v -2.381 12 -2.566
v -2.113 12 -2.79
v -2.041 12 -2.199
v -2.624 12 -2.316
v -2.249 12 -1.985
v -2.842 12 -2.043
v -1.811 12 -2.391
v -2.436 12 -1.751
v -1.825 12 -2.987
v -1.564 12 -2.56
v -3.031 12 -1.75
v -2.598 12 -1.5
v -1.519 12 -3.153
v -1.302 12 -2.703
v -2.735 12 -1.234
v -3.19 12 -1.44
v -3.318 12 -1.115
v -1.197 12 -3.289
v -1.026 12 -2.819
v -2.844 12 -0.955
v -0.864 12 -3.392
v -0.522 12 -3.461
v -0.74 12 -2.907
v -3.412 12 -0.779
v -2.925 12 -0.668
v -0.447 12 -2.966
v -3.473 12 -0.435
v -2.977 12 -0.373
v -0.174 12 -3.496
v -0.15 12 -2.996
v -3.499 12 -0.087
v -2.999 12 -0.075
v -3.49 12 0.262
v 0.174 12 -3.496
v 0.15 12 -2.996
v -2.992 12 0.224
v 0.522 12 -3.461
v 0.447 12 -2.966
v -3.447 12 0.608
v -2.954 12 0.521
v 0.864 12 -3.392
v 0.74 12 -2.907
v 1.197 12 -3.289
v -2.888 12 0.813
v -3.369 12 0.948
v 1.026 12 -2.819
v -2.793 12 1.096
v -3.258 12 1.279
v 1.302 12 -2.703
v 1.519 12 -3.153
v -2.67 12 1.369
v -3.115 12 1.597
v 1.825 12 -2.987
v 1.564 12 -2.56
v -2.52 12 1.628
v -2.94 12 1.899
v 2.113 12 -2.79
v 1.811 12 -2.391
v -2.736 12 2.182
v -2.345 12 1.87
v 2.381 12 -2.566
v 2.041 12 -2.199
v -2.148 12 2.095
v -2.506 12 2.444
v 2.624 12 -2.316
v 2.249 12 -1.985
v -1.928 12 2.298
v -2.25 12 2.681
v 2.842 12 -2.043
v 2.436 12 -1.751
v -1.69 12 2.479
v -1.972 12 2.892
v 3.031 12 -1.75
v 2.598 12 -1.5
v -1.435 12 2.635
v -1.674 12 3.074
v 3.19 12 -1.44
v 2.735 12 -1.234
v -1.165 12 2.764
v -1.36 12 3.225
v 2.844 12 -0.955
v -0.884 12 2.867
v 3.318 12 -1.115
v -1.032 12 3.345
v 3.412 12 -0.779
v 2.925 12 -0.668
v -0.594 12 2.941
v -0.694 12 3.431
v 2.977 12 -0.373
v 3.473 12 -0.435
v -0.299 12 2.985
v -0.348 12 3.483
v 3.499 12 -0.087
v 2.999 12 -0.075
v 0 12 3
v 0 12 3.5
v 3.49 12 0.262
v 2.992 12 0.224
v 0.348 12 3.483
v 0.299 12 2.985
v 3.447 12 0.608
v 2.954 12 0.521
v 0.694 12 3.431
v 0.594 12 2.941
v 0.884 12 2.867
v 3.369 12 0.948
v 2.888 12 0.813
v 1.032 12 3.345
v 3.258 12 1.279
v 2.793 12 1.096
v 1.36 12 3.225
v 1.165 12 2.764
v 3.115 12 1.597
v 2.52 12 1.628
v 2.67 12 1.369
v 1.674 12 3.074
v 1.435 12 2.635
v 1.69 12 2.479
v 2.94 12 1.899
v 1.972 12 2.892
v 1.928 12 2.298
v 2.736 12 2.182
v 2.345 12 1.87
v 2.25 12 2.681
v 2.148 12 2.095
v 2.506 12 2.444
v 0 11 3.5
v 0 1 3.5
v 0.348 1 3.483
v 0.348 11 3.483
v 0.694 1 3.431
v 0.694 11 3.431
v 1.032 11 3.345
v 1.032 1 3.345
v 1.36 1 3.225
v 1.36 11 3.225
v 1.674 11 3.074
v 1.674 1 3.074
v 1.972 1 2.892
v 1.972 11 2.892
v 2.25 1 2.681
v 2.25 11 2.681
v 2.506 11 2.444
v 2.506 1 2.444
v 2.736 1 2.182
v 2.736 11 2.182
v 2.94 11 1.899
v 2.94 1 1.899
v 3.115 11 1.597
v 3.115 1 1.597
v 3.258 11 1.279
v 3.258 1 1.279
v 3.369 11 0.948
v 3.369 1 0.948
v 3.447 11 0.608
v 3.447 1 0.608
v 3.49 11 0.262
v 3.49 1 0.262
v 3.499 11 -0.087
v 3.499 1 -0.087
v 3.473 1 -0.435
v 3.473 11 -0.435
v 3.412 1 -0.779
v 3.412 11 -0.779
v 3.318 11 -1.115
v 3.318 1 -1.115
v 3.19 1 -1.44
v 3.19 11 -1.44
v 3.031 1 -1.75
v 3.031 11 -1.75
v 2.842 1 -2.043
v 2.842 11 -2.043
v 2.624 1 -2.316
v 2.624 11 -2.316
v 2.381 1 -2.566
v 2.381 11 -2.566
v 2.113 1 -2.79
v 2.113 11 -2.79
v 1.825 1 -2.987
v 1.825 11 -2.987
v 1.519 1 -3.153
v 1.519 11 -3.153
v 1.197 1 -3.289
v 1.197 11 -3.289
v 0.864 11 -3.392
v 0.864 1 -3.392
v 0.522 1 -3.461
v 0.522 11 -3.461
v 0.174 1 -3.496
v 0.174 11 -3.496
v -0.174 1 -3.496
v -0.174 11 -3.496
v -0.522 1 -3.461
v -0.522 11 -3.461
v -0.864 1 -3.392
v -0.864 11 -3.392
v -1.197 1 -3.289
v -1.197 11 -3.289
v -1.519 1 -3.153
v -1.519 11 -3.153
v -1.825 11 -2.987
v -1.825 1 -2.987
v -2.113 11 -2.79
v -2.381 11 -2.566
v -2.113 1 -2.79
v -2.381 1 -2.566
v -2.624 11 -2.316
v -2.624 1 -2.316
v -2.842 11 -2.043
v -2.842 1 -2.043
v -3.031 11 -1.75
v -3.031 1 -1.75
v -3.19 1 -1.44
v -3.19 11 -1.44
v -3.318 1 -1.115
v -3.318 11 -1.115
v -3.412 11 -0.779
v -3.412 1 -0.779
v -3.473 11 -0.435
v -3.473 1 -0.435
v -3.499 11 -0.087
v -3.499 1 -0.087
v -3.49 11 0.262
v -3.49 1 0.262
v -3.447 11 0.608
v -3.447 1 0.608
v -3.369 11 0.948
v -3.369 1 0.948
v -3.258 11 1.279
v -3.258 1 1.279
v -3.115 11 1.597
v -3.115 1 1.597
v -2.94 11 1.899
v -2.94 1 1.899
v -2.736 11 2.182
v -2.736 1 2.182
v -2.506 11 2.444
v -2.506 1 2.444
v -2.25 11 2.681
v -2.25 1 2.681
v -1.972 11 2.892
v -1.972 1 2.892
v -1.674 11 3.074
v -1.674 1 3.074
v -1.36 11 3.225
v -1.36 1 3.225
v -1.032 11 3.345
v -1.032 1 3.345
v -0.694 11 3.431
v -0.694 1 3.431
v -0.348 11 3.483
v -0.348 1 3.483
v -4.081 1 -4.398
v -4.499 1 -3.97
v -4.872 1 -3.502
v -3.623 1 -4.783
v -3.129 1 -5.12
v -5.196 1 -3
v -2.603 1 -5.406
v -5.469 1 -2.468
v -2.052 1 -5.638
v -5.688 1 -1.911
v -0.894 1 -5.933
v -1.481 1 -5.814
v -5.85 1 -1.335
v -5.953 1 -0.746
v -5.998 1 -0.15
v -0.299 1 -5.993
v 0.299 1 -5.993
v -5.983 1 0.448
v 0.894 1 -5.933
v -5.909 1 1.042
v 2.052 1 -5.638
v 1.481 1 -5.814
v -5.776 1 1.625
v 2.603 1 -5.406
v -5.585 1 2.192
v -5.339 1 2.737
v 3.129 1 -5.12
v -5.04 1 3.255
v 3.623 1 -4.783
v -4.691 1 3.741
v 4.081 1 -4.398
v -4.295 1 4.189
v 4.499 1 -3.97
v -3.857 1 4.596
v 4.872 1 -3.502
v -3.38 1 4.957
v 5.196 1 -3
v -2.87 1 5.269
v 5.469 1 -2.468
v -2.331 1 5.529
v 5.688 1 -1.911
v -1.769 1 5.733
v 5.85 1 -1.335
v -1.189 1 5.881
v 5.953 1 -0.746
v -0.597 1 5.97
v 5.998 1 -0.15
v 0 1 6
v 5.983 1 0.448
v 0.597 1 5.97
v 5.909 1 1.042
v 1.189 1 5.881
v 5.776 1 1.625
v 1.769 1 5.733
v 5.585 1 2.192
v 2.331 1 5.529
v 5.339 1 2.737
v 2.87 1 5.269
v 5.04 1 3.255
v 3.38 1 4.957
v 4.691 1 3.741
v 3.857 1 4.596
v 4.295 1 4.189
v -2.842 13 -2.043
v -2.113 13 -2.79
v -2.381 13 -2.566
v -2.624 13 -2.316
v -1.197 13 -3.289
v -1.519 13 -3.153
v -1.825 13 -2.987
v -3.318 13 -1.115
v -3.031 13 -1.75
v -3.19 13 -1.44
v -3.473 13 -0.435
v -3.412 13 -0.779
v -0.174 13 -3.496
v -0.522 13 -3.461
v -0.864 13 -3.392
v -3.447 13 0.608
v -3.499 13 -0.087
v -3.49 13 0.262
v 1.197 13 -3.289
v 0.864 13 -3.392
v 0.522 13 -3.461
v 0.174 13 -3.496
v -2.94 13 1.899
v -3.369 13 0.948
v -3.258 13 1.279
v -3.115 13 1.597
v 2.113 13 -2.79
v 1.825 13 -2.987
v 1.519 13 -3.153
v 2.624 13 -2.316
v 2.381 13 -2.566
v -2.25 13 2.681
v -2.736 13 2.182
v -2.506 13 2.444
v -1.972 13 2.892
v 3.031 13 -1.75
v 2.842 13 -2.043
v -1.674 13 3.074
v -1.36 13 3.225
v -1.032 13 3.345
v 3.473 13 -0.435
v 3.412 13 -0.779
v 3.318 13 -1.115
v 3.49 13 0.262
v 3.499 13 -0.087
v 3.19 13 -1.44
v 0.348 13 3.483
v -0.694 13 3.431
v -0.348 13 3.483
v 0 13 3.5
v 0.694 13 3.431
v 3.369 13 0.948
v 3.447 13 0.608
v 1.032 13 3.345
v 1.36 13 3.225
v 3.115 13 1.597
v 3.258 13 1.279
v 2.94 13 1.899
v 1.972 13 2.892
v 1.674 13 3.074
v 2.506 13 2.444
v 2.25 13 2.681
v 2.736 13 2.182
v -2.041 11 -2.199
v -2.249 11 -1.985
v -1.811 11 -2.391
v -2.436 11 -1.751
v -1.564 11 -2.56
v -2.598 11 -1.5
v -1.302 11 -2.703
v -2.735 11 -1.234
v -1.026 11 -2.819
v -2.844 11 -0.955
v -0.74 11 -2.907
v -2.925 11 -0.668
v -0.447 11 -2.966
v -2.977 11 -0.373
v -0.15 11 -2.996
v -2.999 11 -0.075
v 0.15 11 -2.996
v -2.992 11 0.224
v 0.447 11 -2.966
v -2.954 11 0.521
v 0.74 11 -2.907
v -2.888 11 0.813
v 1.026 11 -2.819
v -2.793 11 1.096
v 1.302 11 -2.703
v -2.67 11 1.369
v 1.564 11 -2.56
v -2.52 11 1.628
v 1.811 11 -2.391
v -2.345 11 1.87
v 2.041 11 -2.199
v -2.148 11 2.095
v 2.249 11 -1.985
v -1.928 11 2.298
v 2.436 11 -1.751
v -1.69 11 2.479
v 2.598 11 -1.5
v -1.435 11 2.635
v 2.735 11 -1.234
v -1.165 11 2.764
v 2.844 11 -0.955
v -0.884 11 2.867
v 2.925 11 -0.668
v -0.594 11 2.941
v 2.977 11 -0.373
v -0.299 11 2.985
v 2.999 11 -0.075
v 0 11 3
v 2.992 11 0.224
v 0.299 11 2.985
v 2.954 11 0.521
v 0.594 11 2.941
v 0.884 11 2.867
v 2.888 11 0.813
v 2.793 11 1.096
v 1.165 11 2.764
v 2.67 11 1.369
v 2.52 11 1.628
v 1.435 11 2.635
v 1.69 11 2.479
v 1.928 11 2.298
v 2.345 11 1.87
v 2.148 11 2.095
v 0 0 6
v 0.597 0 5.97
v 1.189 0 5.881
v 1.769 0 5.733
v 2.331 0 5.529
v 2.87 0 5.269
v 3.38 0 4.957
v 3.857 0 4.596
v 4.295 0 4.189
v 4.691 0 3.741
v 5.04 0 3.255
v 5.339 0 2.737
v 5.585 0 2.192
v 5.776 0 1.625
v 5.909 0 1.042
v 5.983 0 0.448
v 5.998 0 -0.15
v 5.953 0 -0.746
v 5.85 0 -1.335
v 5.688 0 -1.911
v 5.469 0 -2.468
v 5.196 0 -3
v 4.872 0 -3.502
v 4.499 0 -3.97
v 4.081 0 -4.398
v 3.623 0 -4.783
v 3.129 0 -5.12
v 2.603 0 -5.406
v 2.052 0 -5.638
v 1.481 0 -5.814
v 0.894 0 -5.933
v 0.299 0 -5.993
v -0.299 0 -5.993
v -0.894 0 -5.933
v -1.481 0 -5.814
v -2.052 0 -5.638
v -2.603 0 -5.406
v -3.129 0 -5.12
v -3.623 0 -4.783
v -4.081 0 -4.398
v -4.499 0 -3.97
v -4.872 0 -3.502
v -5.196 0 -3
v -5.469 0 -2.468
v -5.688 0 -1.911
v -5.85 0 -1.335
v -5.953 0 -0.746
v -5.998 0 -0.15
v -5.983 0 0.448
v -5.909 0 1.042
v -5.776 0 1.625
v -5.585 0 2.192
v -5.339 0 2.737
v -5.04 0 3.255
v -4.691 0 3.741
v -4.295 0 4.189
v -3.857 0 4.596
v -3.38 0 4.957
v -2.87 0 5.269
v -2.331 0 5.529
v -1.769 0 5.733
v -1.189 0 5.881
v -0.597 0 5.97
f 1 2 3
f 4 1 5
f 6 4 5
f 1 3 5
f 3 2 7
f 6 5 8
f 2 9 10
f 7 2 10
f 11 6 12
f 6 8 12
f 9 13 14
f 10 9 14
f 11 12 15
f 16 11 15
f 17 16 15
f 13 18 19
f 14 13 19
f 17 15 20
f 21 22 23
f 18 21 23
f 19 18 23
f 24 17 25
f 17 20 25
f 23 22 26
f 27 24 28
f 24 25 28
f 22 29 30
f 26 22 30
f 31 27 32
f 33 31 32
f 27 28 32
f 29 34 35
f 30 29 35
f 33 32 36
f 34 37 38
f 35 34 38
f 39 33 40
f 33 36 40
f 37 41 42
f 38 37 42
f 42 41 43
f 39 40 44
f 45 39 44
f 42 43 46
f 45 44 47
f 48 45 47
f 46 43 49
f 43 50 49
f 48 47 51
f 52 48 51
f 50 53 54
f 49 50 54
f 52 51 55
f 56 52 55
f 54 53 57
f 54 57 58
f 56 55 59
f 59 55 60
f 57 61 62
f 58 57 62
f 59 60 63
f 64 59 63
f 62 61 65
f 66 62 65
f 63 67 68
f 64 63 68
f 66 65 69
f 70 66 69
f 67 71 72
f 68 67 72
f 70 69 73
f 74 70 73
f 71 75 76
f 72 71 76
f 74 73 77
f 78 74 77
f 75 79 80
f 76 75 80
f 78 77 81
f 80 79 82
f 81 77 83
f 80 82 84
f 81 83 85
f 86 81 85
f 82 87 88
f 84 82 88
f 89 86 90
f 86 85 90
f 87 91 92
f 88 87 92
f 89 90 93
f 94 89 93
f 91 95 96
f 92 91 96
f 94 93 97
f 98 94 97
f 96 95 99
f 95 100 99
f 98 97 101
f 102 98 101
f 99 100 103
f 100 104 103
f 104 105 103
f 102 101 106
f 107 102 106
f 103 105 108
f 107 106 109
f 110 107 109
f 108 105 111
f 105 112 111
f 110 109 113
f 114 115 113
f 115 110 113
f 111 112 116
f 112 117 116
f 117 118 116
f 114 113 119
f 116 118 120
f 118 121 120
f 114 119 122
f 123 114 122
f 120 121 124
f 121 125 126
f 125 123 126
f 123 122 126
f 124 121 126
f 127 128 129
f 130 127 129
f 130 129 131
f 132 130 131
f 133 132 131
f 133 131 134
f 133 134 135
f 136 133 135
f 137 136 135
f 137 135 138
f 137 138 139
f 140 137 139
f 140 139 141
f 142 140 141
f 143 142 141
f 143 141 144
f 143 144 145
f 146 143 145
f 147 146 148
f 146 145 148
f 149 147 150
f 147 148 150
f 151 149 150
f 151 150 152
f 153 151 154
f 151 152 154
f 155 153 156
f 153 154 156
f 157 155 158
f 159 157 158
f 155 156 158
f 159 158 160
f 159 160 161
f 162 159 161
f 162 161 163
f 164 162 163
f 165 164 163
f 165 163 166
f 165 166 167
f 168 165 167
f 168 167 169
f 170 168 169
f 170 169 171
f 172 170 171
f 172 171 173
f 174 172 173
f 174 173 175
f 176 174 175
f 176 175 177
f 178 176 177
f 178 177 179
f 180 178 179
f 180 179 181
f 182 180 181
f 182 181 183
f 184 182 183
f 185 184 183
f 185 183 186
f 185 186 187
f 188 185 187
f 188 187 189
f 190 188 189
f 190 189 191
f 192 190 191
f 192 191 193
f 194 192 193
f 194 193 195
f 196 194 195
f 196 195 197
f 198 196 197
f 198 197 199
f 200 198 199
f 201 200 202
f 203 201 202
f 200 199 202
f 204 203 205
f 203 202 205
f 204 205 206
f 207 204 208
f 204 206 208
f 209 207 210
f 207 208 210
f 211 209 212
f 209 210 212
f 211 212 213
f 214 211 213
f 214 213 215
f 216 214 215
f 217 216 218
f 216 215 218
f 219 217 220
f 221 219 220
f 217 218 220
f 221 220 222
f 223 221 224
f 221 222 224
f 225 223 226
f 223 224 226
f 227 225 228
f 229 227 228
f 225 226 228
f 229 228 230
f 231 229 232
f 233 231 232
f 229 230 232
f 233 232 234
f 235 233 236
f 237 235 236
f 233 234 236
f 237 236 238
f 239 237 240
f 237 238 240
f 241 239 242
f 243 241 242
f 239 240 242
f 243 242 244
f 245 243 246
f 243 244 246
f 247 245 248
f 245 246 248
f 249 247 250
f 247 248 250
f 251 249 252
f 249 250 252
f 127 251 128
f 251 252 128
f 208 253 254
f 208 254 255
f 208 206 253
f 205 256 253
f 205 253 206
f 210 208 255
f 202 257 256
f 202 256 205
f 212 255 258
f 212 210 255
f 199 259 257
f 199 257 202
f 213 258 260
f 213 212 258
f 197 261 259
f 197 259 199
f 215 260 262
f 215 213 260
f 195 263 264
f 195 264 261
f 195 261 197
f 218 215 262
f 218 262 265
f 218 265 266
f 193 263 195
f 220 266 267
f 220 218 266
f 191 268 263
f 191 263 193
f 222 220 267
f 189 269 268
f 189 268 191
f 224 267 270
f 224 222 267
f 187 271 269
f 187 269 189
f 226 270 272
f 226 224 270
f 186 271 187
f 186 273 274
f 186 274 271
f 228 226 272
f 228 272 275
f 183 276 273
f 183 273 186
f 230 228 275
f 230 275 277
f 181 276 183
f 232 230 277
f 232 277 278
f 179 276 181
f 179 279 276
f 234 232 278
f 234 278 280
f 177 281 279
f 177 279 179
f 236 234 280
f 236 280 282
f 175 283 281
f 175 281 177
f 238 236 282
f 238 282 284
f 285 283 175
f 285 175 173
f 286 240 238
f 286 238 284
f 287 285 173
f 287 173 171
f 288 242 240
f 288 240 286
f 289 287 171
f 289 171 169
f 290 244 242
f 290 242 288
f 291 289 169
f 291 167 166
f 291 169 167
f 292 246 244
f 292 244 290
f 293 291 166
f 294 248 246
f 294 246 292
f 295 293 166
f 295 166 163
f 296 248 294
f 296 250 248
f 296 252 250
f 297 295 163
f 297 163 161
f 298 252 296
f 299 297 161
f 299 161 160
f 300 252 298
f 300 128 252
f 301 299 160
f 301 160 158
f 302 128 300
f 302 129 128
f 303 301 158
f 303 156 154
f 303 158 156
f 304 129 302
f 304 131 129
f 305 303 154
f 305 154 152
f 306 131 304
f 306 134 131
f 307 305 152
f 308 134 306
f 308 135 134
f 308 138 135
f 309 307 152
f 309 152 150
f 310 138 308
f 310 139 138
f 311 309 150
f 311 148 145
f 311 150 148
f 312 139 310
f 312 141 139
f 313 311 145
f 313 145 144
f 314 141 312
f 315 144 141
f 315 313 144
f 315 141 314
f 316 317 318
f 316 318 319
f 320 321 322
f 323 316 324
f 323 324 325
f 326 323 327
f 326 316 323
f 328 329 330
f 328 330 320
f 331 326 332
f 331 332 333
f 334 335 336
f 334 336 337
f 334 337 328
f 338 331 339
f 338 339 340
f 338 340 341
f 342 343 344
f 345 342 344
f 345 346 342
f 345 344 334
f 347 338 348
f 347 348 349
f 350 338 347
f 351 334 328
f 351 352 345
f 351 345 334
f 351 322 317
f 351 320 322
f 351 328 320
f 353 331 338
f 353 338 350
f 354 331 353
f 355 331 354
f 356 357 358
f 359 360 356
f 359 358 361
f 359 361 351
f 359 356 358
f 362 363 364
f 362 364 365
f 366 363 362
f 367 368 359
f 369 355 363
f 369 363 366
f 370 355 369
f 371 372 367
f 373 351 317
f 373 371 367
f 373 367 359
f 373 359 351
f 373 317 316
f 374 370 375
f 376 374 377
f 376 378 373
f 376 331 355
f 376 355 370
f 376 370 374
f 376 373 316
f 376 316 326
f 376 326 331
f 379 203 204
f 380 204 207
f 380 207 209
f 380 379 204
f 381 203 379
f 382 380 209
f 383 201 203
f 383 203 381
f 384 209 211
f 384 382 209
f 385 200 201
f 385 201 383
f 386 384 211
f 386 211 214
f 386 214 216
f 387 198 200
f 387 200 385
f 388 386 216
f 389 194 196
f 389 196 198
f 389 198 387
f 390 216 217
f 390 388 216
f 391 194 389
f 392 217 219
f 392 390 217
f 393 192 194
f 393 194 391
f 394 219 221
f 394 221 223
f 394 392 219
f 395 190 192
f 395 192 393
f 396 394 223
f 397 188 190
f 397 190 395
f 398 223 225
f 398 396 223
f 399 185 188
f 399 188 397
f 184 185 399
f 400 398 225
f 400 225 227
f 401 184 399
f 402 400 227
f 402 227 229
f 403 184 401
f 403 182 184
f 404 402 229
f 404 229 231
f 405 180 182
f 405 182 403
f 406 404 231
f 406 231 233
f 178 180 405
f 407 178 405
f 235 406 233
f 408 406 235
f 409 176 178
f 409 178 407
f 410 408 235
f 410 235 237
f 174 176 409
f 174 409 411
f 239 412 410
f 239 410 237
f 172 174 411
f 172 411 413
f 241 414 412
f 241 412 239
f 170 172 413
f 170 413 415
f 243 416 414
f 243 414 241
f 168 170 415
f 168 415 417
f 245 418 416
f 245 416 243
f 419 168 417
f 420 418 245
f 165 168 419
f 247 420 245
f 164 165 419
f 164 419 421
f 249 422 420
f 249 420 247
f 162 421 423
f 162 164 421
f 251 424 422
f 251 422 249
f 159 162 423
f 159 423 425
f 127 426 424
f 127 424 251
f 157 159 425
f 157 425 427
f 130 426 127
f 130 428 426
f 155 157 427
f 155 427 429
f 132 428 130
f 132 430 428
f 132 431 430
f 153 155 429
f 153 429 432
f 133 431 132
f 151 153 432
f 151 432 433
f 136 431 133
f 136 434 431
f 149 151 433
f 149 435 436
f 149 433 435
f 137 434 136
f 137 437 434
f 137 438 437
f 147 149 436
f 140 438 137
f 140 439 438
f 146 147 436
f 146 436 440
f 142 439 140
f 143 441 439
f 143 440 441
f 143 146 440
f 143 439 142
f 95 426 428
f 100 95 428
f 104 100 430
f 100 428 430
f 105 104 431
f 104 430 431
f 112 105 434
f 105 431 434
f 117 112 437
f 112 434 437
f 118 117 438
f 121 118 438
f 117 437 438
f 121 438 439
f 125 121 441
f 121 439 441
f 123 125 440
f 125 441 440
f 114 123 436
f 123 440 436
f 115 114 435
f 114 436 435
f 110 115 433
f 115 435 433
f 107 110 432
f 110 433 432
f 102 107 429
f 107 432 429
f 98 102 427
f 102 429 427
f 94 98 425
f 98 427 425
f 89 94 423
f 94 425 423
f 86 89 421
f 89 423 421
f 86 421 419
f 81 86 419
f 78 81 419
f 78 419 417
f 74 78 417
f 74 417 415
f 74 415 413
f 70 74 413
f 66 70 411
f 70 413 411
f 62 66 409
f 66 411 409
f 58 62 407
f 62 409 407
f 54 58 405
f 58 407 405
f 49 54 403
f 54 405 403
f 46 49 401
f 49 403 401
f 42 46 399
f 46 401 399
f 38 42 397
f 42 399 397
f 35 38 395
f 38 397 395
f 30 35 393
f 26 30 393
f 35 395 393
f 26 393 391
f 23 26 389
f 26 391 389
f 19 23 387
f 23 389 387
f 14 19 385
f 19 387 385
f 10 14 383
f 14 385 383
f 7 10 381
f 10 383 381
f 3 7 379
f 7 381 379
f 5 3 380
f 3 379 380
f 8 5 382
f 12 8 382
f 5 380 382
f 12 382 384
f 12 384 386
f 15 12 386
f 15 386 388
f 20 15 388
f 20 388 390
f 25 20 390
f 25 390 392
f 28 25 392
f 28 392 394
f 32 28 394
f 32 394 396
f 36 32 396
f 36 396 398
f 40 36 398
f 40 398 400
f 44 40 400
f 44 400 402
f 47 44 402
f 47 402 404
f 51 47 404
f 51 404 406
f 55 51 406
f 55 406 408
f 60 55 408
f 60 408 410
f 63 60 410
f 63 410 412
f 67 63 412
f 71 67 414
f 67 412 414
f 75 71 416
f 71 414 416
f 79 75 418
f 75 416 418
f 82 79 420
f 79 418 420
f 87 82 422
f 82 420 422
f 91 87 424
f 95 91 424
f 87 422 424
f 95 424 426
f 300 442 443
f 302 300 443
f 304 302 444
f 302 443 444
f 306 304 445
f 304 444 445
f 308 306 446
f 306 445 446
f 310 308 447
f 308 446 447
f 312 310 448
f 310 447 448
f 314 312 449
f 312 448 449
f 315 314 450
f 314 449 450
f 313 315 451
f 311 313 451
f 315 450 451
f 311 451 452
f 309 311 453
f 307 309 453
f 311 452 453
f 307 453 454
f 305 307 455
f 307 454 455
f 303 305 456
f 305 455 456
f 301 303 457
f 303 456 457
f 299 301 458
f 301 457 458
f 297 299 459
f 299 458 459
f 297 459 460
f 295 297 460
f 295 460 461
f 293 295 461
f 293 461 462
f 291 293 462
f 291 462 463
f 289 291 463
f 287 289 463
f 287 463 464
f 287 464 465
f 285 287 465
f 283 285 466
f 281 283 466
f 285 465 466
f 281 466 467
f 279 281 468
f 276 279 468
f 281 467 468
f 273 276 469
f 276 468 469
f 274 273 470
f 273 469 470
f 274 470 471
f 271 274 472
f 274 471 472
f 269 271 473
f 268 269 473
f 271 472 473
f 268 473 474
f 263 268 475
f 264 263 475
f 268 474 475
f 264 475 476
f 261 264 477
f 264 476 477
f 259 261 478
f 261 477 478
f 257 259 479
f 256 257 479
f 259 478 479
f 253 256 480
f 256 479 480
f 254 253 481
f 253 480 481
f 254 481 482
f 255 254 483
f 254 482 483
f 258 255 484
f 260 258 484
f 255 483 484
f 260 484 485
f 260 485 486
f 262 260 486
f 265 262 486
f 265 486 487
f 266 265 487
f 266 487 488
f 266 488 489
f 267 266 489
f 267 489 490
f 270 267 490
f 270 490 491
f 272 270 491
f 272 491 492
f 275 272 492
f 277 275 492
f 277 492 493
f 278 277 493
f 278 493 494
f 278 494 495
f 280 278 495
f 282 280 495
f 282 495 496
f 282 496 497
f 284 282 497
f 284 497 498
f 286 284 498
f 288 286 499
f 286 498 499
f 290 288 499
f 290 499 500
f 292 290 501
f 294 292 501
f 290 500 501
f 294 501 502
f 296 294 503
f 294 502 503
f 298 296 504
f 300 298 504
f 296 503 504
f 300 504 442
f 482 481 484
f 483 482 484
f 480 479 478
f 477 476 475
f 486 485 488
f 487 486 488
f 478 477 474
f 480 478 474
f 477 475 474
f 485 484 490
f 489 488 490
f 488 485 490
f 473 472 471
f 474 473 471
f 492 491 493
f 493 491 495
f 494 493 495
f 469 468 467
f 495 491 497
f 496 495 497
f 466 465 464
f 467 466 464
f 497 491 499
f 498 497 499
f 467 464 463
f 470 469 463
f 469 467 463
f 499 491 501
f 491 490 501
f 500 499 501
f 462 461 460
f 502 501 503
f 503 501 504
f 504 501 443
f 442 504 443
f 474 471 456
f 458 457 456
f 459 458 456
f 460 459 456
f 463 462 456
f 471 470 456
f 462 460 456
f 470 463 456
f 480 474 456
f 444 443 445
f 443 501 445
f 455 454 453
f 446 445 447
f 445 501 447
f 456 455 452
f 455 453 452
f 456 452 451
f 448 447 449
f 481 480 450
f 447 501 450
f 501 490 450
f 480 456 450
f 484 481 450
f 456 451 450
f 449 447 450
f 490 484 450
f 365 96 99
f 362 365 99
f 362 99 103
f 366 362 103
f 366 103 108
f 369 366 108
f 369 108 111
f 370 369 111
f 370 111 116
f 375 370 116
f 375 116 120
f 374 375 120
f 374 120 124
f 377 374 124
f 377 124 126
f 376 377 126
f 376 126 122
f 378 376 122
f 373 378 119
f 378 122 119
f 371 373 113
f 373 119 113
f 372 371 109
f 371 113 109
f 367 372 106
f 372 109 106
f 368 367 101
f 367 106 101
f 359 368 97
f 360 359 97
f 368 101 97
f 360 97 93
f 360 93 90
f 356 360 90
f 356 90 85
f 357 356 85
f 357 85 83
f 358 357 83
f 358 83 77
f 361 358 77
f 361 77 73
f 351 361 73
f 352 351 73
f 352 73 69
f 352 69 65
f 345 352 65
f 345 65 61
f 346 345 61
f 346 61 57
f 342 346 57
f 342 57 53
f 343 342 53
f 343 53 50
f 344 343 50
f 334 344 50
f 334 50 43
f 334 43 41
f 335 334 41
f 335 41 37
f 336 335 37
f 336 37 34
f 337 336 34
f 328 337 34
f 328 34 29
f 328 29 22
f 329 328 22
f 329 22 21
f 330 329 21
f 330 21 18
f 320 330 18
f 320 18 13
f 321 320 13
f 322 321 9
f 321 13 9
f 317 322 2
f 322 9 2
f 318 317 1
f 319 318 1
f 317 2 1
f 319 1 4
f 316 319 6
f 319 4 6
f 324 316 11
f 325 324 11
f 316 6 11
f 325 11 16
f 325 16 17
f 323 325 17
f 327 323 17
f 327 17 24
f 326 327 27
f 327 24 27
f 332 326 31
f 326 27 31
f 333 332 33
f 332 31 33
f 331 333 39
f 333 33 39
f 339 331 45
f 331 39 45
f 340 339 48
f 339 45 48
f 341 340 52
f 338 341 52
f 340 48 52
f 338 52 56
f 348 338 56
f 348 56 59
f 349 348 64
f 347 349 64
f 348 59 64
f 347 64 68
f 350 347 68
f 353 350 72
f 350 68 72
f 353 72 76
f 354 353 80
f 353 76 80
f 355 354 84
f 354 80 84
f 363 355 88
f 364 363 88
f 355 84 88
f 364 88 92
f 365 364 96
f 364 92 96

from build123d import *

# Parameters (mm, degrees)
ESBO_O1_R                = 6
RESSALTO_EXTRUS_O1_DEPTH = 1
ESBO_O2_R                = 3.5
RESSALTO_EXTRUS_O2_DEPTH = 12
CORTE_EXTRUS_O1_START    = -2
ESBO_O3_R                = 3.5
ESBO_O3_R_2              = 3
CORTE_EXTRUS_O1_DEPTH    = 1


with BuildPart() as part:
    # Esboço1 → Ressalto-extrusão1 (new body)
    with BuildSketch(Plane(origin=(0, 0, 0), x_dir=(1, 0, 0), z_dir=(0, 1, 0))):
        with Locations(Location((0, 0, 0), (0, 0, 270))):
            Circle(ESBO_O1_R)
    extrude(amount=RESSALTO_EXTRUS_O1_DEPTH)

    # Esboço2 → Ressalto-extrusão2 (add)
    with BuildSketch(Plane(origin=(0, 1, 0), x_dir=(1, 0, 0), z_dir=(0, 1, 0))):
        with Locations(Location((0, 0, 0), (0, 0, 270))):
            Circle(ESBO_O2_R)
    extrude(amount=RESSALTO_EXTRUS_O2_DEPTH)

    # Esboço3 → Corte-extrusão1 (cut)
    with BuildSketch(Plane(origin=(0, 13, 0), x_dir=(1, 0, 0), z_dir=(0, 1, 0)).offset(CORTE_EXTRUS_O1_START)):
        with Locations(Location((0, 0, 0), (0, 0, 270))):
            Circle(ESBO_O3_R)
        with Locations(Location((0, 0, 0), (0, 0, 270))):
            Circle(ESBO_O3_R_2, mode=Mode.SUBTRACT)
    extrude(amount=CORTE_EXTRUS_O1_DEPTH, mode=Mode.SUBTRACT)


solid = part.part
